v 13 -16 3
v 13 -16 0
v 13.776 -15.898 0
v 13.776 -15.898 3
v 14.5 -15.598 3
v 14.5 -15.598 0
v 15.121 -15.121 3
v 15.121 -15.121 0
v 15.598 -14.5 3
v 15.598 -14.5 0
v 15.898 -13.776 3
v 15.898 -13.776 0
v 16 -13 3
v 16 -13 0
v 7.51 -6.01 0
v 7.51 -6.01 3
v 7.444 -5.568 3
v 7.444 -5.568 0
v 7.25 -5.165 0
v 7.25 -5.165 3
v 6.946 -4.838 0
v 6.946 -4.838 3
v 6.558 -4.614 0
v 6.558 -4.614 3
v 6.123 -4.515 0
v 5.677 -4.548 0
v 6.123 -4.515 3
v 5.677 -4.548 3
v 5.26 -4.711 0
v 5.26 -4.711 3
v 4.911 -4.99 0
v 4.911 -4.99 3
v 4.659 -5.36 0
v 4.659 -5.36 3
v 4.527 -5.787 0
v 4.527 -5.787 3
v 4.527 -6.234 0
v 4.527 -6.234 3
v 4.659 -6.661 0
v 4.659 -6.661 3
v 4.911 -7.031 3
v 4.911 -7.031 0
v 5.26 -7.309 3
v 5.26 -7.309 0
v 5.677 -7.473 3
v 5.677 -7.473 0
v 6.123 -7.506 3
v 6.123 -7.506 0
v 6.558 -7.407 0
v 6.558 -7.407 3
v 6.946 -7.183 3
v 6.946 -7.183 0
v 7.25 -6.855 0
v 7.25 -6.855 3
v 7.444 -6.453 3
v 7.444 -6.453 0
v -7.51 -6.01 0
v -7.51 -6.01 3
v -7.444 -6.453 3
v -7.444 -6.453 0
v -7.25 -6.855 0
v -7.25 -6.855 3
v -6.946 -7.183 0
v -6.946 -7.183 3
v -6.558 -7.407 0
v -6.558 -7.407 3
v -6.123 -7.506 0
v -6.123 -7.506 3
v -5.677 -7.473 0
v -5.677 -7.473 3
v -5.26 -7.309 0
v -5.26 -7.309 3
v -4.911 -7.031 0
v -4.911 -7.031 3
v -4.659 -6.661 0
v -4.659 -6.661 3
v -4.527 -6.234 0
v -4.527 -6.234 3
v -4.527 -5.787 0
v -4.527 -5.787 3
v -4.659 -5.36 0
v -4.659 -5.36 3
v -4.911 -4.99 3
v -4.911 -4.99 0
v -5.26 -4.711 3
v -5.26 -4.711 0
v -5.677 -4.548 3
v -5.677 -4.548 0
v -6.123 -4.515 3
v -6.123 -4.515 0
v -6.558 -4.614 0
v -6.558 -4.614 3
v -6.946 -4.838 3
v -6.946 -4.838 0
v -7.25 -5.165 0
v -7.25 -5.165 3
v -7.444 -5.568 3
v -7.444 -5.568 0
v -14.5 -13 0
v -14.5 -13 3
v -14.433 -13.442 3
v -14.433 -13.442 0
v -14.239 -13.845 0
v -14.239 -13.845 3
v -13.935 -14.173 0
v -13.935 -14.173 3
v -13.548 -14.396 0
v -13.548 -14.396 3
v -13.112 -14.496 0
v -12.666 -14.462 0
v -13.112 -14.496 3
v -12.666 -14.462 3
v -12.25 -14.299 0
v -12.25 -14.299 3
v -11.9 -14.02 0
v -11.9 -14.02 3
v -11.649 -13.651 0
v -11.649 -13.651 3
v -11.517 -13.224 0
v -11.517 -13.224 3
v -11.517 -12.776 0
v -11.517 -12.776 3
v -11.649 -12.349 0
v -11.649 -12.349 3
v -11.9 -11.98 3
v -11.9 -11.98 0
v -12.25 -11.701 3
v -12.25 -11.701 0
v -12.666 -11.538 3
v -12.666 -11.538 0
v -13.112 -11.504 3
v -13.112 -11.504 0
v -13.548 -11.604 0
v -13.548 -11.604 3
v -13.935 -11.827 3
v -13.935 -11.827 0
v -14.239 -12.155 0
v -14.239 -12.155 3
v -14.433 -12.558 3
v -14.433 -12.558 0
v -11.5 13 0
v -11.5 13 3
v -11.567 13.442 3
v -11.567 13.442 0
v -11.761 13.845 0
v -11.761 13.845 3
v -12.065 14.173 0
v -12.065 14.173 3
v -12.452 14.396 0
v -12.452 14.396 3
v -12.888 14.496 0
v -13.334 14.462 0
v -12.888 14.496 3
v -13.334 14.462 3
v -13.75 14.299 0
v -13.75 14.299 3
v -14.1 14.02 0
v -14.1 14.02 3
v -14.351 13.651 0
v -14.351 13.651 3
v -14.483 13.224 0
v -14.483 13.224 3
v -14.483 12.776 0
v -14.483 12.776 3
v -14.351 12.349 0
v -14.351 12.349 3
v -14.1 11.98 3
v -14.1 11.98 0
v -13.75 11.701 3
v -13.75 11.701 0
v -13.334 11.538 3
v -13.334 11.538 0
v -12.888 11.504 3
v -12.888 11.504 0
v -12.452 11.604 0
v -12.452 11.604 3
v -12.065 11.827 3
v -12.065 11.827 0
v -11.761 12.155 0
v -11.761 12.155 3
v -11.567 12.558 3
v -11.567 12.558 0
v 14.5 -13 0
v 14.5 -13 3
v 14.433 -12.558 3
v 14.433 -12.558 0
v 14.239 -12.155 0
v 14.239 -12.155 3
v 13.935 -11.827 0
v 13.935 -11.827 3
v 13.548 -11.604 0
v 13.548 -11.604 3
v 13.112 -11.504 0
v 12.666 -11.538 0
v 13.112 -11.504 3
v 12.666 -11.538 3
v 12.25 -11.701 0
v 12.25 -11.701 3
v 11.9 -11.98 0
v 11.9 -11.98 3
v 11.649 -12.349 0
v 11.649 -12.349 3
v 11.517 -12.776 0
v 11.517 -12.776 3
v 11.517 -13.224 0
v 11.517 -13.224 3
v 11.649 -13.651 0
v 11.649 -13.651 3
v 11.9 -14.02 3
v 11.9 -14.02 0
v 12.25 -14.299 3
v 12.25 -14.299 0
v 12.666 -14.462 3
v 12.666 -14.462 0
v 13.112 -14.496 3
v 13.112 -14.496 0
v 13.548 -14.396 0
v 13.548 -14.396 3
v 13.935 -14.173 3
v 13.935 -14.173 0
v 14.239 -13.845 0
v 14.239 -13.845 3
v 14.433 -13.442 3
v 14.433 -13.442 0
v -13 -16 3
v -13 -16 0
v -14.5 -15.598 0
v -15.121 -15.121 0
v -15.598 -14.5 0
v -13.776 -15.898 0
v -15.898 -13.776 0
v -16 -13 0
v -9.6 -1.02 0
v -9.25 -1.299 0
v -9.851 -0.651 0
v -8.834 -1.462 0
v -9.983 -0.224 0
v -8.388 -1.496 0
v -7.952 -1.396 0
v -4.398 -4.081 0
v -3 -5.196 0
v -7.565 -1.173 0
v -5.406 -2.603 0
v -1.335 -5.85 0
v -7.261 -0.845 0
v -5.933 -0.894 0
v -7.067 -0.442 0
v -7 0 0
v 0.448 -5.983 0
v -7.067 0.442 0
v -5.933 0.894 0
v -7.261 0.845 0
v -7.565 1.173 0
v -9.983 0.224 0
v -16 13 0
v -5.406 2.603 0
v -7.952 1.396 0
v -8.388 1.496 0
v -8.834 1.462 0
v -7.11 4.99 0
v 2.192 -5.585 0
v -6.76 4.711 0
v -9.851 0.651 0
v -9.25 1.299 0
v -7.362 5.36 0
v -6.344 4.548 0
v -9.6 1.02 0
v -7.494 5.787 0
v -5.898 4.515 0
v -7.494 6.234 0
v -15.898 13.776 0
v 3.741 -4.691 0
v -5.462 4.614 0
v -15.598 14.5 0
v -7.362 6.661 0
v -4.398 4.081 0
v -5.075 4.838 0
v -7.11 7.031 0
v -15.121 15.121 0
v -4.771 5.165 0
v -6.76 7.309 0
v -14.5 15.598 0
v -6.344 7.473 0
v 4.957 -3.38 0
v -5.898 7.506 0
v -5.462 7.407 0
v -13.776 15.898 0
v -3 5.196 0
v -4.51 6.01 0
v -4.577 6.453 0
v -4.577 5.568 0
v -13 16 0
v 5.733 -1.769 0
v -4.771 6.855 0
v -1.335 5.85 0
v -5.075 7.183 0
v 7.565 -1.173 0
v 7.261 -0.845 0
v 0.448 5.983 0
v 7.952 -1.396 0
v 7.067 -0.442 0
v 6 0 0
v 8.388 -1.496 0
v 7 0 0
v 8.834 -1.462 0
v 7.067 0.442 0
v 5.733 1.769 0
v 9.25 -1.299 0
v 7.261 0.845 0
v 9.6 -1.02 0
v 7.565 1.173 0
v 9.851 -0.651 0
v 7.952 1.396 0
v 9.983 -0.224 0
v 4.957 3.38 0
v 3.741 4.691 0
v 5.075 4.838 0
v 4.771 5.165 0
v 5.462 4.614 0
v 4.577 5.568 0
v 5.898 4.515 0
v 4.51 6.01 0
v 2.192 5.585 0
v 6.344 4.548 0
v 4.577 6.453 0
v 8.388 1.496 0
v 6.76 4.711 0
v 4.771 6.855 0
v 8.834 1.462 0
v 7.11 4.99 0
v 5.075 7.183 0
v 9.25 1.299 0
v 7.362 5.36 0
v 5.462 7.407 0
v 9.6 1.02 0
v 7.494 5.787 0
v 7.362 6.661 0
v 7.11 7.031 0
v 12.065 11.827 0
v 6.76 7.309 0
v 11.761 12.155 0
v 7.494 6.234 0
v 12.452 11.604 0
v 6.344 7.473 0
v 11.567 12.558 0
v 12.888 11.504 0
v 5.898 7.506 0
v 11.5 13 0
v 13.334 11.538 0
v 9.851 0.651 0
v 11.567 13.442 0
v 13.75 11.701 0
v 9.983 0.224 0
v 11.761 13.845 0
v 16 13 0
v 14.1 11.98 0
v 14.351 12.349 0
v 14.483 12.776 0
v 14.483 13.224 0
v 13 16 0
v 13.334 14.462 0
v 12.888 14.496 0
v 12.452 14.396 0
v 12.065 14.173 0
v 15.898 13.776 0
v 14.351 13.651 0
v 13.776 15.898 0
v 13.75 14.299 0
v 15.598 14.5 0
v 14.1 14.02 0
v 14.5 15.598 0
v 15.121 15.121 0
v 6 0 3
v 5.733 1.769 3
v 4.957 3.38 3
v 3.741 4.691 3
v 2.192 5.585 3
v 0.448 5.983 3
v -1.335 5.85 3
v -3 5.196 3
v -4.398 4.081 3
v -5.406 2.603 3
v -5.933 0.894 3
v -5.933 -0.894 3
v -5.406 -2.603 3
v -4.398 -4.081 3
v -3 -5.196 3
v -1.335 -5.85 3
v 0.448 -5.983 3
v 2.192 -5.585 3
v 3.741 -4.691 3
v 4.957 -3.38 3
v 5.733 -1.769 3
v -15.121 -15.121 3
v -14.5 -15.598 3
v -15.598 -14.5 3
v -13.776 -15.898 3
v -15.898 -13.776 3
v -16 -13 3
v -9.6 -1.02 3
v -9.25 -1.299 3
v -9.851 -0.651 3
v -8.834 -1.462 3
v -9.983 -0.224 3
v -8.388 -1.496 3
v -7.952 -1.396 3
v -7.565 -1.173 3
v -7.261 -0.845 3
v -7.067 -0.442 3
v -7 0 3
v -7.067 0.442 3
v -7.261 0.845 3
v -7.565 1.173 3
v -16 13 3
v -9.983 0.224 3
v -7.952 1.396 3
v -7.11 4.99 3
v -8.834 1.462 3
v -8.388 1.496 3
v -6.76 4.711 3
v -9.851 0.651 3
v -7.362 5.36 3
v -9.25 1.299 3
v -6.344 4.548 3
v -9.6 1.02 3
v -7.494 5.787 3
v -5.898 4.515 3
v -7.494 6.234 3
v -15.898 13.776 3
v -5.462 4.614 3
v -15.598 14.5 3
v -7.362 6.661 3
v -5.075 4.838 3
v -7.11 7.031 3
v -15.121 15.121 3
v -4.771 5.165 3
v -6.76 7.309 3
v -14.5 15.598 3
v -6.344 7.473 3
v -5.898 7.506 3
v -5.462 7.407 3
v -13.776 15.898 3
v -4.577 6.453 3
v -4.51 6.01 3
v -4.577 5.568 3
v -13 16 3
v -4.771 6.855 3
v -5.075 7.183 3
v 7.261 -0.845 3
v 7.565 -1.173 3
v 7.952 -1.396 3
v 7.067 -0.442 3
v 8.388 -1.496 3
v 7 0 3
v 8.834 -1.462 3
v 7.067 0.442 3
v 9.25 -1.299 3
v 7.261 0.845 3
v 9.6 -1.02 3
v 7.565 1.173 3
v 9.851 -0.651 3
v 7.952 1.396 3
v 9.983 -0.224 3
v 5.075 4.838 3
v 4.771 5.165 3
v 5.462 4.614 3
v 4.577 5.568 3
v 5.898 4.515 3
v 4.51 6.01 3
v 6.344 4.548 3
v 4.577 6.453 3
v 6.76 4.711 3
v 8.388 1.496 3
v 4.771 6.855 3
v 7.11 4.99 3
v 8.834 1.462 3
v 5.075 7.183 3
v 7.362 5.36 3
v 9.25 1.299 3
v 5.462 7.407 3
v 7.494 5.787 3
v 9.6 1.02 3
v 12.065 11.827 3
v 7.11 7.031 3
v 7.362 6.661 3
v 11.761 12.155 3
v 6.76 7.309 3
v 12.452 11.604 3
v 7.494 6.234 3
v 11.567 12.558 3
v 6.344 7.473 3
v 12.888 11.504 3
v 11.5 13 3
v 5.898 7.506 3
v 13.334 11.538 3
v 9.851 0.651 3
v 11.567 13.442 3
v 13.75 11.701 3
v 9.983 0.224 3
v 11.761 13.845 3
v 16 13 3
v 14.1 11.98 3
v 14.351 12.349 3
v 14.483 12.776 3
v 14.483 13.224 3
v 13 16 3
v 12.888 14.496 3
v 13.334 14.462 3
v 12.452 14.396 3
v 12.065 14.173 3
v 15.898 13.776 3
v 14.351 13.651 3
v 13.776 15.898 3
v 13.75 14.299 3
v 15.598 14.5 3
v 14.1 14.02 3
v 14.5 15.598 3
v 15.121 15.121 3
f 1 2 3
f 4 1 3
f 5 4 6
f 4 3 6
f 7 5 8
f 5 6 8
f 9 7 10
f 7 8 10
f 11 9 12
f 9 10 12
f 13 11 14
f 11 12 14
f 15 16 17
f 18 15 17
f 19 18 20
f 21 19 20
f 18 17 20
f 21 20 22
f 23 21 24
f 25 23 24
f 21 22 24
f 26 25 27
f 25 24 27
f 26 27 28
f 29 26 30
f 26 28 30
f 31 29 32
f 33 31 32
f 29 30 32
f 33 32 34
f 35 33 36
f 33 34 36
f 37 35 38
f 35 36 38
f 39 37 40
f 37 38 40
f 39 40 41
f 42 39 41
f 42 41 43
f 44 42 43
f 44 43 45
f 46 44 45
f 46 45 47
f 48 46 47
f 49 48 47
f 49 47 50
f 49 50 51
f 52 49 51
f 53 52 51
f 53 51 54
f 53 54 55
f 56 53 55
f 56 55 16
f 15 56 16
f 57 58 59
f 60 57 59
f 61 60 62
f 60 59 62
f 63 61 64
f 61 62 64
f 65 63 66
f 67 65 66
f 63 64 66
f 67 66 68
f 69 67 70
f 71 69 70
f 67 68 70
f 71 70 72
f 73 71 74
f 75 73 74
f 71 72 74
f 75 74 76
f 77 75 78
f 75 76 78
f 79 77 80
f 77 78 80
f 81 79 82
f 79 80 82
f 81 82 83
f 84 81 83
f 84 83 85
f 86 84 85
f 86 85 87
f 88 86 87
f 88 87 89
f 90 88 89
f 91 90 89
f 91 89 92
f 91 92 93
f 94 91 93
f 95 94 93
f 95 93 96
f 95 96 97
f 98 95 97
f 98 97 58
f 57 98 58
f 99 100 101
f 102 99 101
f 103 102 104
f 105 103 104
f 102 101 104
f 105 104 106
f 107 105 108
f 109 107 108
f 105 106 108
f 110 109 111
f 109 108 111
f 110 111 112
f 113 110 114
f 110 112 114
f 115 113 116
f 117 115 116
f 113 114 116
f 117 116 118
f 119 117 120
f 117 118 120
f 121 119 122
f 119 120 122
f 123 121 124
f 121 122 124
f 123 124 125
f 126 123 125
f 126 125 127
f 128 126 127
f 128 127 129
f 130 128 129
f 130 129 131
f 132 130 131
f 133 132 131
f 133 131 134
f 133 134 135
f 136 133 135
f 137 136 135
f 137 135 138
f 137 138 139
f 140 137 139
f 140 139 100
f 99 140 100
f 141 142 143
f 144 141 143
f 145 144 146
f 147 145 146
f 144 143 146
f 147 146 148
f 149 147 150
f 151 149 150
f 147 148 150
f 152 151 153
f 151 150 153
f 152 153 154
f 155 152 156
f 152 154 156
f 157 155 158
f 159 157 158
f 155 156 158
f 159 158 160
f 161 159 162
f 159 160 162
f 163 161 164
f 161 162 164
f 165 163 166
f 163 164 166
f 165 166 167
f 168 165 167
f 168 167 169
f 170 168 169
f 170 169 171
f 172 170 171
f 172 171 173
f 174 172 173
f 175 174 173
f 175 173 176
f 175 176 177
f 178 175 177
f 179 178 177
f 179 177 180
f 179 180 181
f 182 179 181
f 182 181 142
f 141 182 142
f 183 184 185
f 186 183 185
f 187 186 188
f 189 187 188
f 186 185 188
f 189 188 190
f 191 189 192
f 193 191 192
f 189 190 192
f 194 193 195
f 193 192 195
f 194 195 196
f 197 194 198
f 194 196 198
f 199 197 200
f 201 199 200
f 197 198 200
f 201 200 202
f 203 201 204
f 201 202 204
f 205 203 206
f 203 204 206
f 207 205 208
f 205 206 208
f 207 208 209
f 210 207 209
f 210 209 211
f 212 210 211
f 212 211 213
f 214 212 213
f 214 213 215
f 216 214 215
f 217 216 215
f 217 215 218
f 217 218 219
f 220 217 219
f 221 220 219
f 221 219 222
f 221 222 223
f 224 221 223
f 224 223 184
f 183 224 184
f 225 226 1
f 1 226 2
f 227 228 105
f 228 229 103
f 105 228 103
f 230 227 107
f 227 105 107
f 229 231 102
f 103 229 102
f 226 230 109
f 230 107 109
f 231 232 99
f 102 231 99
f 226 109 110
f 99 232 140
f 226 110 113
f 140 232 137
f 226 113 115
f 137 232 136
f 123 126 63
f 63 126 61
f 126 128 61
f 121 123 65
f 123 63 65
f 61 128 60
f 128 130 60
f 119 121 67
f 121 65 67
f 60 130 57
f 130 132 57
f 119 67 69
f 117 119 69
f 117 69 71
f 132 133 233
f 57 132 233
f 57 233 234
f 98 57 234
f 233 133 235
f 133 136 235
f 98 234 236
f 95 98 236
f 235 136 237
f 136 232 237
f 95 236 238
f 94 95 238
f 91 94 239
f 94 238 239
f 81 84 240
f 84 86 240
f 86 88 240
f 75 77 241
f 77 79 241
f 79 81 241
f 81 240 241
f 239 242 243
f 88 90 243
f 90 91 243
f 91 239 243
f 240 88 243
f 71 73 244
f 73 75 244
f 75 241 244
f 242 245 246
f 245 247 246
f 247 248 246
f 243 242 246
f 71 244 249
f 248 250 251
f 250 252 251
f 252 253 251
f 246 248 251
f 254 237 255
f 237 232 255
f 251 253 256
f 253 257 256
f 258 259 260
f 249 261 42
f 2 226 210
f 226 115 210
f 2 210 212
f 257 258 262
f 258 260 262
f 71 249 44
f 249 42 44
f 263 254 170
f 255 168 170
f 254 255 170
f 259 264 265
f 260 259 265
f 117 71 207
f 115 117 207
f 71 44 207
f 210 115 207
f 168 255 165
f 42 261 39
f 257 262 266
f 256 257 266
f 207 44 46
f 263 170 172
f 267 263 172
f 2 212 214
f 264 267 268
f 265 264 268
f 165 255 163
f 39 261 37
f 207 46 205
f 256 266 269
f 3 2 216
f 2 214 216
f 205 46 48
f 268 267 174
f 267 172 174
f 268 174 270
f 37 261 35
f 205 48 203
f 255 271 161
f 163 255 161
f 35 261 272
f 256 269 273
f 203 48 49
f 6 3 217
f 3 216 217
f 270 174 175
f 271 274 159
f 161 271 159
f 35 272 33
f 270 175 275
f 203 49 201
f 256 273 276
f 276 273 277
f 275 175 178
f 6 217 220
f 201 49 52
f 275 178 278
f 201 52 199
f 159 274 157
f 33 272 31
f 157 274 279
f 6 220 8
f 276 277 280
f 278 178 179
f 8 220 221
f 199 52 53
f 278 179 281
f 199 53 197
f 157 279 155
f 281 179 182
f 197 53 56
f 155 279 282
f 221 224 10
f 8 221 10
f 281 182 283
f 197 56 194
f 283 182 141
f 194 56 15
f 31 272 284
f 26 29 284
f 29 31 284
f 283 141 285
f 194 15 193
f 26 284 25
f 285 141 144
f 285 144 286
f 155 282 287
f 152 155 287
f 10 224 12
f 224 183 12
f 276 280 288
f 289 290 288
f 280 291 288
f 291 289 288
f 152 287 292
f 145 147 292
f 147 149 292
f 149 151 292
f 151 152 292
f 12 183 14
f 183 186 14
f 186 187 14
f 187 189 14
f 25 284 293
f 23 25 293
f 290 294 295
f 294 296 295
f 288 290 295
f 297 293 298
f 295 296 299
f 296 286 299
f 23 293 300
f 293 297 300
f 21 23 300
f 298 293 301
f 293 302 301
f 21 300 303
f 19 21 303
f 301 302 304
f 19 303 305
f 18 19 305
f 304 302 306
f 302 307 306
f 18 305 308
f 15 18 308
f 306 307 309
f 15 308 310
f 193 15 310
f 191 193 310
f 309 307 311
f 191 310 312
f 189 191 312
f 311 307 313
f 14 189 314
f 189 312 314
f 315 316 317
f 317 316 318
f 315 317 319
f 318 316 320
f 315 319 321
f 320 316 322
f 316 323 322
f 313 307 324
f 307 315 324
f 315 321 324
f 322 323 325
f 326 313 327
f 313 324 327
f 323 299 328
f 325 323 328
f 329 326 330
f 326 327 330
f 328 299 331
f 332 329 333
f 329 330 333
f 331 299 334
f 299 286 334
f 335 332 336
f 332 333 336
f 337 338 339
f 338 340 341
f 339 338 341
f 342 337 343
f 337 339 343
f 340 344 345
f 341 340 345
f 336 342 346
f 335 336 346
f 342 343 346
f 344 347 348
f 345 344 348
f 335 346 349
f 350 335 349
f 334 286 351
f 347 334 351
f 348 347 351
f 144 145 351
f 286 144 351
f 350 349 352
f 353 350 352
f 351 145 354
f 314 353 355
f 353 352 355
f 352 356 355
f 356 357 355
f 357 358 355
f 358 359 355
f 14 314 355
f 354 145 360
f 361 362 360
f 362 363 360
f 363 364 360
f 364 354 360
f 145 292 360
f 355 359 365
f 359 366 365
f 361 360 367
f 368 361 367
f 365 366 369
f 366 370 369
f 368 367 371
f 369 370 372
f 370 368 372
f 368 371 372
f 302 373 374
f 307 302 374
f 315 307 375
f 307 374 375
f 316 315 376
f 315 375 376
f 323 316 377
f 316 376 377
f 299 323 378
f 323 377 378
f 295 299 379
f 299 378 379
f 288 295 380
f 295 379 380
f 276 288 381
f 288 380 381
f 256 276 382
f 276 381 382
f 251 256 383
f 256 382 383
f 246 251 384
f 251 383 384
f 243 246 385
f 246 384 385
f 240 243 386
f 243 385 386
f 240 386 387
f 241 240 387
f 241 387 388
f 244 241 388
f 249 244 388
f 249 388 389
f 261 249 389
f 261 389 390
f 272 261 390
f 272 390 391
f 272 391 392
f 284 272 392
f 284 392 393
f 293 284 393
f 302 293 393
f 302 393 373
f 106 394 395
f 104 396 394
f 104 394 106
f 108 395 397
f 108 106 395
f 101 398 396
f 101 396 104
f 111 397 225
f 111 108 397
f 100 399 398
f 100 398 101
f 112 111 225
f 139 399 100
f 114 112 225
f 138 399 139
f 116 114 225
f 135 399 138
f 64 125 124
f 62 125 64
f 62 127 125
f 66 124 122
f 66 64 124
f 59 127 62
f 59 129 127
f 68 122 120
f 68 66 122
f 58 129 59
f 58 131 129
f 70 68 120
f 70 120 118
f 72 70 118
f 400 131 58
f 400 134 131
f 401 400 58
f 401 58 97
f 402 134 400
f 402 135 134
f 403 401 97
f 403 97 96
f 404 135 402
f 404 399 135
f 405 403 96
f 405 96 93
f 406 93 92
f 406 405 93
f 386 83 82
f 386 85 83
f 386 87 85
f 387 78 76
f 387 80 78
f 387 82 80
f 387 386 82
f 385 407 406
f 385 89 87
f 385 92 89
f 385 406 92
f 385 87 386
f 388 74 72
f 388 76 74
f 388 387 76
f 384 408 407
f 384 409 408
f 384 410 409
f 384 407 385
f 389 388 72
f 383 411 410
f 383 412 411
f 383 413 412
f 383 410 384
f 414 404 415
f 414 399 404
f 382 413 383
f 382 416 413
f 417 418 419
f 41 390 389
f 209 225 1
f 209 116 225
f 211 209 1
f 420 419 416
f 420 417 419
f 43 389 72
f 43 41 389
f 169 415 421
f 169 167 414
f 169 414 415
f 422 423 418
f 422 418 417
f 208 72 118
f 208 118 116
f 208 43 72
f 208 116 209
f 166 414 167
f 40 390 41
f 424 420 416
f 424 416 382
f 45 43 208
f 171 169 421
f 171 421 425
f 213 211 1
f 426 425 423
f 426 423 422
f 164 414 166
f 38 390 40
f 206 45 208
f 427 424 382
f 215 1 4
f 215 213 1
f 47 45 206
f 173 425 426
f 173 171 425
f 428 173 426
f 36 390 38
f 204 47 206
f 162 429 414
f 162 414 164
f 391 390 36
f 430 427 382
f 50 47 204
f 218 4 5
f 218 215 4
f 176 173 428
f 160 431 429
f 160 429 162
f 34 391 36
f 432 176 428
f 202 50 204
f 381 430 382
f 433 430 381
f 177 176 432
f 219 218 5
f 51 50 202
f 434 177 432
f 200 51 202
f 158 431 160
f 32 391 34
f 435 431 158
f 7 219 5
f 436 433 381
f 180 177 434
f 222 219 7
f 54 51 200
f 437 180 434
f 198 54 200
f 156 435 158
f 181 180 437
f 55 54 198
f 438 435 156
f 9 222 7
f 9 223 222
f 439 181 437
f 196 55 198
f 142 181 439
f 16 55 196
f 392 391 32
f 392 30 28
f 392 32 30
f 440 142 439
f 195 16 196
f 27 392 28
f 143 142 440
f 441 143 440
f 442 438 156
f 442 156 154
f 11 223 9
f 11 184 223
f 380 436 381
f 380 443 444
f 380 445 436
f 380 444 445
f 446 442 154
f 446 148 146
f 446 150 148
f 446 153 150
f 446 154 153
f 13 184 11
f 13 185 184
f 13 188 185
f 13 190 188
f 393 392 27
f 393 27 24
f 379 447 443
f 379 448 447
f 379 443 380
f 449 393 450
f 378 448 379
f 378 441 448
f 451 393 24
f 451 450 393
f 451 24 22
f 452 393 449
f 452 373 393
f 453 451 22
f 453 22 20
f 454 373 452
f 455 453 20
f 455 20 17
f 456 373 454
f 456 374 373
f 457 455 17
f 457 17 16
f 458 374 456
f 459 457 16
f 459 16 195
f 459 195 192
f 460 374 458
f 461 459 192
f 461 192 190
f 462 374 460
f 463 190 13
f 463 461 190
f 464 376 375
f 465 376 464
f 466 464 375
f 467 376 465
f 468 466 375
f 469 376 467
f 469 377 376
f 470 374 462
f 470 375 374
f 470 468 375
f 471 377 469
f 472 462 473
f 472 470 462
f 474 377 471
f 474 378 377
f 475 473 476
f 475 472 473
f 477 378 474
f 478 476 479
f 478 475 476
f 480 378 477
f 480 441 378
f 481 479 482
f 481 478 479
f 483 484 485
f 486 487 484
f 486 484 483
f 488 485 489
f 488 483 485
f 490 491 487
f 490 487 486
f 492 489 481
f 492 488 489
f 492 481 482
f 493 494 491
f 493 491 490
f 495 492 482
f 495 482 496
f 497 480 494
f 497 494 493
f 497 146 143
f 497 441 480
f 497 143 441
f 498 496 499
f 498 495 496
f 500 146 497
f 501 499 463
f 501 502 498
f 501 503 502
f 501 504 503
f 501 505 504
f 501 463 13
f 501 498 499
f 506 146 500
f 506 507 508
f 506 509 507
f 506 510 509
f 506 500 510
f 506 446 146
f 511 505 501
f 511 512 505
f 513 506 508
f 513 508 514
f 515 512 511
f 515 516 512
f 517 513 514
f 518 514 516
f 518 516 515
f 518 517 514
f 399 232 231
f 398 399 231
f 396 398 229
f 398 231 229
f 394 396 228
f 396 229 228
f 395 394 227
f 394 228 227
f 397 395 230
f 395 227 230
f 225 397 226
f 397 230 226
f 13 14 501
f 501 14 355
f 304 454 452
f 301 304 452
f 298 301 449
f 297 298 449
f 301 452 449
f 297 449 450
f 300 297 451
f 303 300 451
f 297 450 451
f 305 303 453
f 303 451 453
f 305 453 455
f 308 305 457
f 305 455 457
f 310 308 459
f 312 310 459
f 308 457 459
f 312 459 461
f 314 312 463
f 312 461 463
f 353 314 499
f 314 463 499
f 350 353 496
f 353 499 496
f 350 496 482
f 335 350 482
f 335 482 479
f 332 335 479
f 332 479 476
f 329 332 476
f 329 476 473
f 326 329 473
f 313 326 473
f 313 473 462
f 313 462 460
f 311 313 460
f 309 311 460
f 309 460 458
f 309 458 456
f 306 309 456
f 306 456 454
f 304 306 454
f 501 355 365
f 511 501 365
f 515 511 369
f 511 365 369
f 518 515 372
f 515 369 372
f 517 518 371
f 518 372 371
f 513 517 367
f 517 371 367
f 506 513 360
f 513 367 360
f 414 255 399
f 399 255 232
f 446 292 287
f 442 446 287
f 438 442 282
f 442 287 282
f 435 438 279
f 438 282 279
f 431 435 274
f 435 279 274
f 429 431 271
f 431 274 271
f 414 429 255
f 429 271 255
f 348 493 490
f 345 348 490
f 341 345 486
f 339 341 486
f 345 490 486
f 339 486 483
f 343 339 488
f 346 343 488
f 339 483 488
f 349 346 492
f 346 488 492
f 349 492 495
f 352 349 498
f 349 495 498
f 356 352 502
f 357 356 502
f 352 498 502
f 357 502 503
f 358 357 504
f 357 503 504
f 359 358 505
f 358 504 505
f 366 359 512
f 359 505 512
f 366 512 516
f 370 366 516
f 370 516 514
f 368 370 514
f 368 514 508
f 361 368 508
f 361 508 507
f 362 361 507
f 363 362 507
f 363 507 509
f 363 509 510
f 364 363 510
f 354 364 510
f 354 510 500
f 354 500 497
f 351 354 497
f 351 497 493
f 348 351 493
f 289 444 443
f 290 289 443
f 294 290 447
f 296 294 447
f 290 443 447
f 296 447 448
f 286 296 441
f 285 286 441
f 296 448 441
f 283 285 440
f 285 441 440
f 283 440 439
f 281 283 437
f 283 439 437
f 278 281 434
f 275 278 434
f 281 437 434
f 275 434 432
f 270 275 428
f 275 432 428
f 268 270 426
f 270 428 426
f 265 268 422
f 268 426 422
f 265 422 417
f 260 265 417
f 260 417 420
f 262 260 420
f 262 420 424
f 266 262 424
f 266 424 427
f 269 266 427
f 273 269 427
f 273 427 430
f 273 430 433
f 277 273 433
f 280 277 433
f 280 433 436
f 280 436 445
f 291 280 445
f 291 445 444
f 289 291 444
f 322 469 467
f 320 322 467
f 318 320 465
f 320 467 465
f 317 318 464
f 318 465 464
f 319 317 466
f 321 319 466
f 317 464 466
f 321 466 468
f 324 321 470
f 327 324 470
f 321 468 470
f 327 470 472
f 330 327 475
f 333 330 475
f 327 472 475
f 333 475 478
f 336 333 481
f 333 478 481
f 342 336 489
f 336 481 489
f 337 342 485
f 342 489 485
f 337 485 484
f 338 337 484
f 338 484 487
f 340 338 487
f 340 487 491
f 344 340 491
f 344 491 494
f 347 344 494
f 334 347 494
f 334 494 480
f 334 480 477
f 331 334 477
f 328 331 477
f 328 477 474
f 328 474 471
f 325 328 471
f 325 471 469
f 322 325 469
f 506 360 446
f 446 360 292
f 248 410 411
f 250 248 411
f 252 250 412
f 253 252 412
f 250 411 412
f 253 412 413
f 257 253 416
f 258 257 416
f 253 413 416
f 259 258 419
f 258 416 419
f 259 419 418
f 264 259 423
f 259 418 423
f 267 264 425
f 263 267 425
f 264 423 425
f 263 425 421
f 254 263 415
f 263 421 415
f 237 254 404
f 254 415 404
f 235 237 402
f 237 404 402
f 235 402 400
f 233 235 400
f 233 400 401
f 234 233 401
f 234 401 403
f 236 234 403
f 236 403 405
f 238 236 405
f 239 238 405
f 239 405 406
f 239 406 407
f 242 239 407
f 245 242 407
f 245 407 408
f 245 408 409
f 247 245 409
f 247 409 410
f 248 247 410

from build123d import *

# Parameters (mm, degrees)
BOSS_EXTRU_1_DEPTH      = 3
ESQUISSE2_R             = 6
ESQUISSE2_R_2           = 1.5
ENL_V_MAT_EXTRU_1_DEPTH = 23.825424421
ESQUISSE3_R             = 1.5
ENL_V_MAT_EXTRU_2_DEPTH = 23.825424421


with BuildPart() as part:
    # Esquisse1 → Boss.-Extru.1 (new body)
    with BuildSketch(Plane.XY):
        with BuildLine():
            Line((-13, -16), (13, -16))
            ThreePointArc((13, -16), (15.121320344, -15.121320344), (16, -13))
            Line((16, -13), (16, 13))
            ThreePointArc((16, 13), (15.121320344, 15.121320344), (13, 16))
            Line((13, 16), (-13, 16))
            ThreePointArc((-13, 16), (-15.121320344, 15.121320344), (-16, 13))
            Line((-16, 13), (-16, -13))
            ThreePointArc((-16, -13), (-15.121320344, -15.121320344), (-13, -16))
        make_face()
    extrude(amount=BOSS_EXTRU_1_DEPTH)

    # Esquisse2 → Enlèv. mat.-Extru.1 (cut, through all)
    with BuildSketch(Plane.XY.offset(3)):
        Circle(ESQUISSE2_R)
        with Locations((-8.5, 0)):
            Circle(ESQUISSE2_R_2)
        with Locations((-6.01040764, 6.01040764)):
            Circle(ESQUISSE2_R_2)
        with Locations(Location((-6.01040764, -6.01040764, 0), (0, 0, 180))):
            Circle(ESQUISSE2_R_2)
        with Locations((6.01040764, -6.01040764)):
            Circle(ESQUISSE2_R_2)
        with Locations(Location((8.5, 0, 0), (0, 0, 180))):
            Circle(ESQUISSE2_R_2)
        with Locations(Location((6.01040764, 6.01040764, 0), (0, 0, 180))):
            Circle(ESQUISSE2_R_2)
    extrude(amount=-ENL_V_MAT_EXTRU_1_DEPTH, mode=Mode.SUBTRACT)

    # Esquisse3 → Enlèv. mat.-Extru.2 (cut, through all)
    with BuildSketch(Plane.XY.offset(3)):
        with Locations((-13, 13)):
            Circle(ESQUISSE3_R)
        with Locations(Location((13, 13, 0), (0, 0, 180))):
            Circle(ESQUISSE3_R)
        with Locations((13, -13)):
            Circle(ESQUISSE3_R)
        with Locations(Location((-13, -13, 0), (0, 0, 180))):
            Circle(ESQUISSE3_R)
    extrude(amount=-ENL_V_MAT_EXTRU_2_DEPTH, mode=Mode.SUBTRACT)


solid = part.part
